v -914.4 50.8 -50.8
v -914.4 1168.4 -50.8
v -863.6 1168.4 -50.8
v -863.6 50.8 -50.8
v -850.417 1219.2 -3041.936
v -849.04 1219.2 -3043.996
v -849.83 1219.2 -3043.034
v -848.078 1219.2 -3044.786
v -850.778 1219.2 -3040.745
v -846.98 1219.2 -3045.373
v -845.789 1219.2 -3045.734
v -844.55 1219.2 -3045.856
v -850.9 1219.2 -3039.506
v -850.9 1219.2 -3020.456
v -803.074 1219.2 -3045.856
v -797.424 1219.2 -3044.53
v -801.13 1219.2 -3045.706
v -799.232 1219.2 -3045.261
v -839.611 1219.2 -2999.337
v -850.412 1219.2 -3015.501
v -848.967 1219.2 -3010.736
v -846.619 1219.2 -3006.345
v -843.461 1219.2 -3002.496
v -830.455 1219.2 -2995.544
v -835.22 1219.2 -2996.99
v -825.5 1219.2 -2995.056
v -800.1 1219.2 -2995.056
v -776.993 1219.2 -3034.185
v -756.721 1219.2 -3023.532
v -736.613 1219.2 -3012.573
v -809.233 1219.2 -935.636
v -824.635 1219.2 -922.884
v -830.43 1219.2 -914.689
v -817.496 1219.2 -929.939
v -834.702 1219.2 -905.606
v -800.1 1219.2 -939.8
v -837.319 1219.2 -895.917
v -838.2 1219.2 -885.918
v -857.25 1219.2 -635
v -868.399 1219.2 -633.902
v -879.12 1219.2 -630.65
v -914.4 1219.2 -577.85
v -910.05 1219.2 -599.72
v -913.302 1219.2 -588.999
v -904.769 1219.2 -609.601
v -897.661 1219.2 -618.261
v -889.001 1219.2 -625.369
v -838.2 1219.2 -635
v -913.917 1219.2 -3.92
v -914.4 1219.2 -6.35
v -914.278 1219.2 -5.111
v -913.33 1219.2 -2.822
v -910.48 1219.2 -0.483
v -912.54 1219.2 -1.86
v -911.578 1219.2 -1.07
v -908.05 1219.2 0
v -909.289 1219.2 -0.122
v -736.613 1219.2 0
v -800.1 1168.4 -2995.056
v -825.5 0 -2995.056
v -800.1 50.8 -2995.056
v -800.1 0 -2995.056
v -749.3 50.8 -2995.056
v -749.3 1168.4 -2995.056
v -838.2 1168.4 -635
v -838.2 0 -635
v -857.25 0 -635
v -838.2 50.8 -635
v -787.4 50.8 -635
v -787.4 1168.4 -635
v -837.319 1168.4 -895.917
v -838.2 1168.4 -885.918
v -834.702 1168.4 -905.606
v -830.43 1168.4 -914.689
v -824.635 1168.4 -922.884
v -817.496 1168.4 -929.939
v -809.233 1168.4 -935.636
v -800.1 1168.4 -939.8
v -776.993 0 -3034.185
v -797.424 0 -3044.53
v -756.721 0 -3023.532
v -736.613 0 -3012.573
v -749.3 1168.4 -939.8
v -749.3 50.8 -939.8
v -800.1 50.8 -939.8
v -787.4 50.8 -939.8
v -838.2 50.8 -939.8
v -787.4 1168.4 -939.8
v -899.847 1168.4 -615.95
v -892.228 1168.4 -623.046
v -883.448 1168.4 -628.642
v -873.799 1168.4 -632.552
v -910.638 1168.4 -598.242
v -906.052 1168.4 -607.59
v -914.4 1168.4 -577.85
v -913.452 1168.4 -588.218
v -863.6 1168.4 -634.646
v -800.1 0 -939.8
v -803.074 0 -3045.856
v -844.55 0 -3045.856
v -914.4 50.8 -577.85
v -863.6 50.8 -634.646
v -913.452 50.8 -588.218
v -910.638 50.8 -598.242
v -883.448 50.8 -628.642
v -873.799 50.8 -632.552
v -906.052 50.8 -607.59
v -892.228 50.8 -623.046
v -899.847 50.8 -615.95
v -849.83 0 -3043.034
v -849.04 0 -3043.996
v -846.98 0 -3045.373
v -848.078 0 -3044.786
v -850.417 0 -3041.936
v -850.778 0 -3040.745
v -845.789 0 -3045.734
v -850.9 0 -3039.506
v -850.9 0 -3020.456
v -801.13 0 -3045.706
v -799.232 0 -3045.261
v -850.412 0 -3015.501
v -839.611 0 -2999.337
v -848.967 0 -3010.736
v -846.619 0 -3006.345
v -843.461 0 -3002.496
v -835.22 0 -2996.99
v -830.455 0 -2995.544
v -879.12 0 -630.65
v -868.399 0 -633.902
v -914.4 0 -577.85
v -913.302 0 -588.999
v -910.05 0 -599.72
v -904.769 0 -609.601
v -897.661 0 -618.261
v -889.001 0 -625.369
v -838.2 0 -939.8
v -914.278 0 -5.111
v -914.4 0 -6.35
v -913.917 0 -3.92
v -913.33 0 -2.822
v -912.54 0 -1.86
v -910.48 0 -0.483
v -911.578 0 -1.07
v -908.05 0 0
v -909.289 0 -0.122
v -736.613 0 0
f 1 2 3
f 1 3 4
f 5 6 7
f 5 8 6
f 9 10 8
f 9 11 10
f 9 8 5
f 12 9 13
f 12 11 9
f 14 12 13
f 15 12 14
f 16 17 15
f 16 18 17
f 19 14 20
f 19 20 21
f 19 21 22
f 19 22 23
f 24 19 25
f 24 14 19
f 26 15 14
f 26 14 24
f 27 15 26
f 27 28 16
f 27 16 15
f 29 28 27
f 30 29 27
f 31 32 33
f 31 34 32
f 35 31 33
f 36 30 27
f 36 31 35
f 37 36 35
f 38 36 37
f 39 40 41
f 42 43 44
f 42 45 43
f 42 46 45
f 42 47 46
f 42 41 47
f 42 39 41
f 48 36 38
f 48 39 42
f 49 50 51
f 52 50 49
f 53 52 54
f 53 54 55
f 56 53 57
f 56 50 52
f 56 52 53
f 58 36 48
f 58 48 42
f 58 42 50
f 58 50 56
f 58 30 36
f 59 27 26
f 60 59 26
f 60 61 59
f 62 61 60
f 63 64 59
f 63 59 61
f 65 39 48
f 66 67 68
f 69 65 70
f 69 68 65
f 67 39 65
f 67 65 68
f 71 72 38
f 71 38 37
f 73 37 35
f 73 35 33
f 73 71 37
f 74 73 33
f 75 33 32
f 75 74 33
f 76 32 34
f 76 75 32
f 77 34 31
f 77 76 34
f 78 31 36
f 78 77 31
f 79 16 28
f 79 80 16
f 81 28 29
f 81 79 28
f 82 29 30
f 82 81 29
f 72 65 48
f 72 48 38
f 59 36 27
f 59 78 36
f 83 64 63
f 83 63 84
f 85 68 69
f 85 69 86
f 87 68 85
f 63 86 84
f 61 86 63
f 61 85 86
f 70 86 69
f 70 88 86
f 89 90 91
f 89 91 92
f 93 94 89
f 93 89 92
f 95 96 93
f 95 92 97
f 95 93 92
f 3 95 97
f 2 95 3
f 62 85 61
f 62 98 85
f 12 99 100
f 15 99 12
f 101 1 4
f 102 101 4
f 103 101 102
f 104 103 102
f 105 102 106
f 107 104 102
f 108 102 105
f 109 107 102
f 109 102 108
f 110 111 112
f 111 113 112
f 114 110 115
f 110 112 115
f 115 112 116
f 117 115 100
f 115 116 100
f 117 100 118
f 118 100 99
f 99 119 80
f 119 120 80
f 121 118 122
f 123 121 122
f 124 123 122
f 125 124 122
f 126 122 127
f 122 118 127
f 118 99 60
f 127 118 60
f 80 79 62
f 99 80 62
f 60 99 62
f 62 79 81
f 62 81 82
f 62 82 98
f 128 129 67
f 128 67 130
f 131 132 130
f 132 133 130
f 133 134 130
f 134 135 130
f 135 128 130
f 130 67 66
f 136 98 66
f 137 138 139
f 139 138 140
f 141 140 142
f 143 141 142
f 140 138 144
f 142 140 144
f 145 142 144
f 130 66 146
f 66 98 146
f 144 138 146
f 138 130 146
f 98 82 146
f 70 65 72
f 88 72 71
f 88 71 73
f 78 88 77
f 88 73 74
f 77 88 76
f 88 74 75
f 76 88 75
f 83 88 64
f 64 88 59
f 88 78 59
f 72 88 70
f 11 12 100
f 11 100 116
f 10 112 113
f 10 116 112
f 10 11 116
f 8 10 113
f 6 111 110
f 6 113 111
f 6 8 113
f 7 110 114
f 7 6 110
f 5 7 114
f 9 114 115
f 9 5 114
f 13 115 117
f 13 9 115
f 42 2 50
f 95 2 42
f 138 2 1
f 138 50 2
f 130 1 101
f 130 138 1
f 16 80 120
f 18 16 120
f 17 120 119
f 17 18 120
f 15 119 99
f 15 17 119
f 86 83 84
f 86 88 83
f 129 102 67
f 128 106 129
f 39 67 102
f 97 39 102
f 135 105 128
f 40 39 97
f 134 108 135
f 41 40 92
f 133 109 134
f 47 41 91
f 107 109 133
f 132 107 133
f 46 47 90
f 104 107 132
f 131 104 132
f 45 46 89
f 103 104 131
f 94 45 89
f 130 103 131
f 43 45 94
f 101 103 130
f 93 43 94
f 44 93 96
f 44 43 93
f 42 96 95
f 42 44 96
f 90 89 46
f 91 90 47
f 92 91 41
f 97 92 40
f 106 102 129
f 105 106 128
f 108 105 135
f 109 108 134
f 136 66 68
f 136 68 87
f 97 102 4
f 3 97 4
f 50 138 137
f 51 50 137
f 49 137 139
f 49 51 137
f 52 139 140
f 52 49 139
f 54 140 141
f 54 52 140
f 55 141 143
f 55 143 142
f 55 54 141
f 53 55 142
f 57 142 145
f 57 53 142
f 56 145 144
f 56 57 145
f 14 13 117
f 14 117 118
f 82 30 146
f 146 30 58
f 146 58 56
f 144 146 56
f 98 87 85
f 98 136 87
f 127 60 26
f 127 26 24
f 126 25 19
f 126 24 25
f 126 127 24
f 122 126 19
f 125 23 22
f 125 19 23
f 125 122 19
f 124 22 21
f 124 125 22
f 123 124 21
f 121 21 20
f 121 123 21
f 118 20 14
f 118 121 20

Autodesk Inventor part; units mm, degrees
ref_plane "YZ Plane" through (0, 0, 0) normal (1, 0, 0) x (0, 1, 0)
ref_plane "XZ Plane" through (0, 0, 0) normal (0, 1, 0) x (-1, 0, 0)
ref_plane "XY Plane" through (0, 0, 0) normal (0, 0, 1) x (1, 0, 0)
sketch "Sketch1" plane through (0, 0, 0) normal (0, 1, 0) x (-1, 0, 0)
  line L0 (0, 0) -> (914.4, 0)
  line L1 (914.4, 0) -> (914.4, -70.0282)
  line L2 (0, 0) -> (508, 0)
  line L3 (914.4, 0) -> (660.4, 0)
  line L4 (660.4, 0) -> (611.4196, -58.3726)
  arc A0 (611.4196, -58.3726) -> (0, -274.3016) centre (714.4556, -1323.7323) ccw
  arc A1 (0, -2040.0836) -> (800.1, -3045.8561) centre (1469.1296, -1692.5086) ccw
  arc A2 (0, -274.3016) -> (0, -2040.0836) centre (7568.6791, -1157.1926) ccw
  line L5 (914.4, 0) -> (660.4, 0)
  line L6 (914.4, 0) -> (914.4, -635)
  line L7 (914.4, -635) -> (838.2, -635)
  line L8 (838.2, -635) -> (838.2, -939.8)
  line L9 (838.2, -939.8) -> (800.1, -939.8)
  line L10 (800.1, -939.8) -> (800.1, -3045.8561)
  dimension "d1" = 3048
  dimension "d2" = 508
  dimension "d11" = 76.2
  dimension "d12" = 130
  dimension "d14" = 7620
  dimension "d15" = 635
  dimension "d16" = 76.2
  dimension "d17" = 304.8
  dimension "d18" = 38.1
extrude "Extrusion1" add sketch "Sketch1" along normal blind 1219.2
sketch "Sketch3" plane through (-914.4, 0, -635) normal (-1, 0, 0) x (0, 0, 1)
  line L0 (0, 0) -> (635, 0) projected
  line L1 (0, 0) -> (0, 1219.2) projected
  line L2 (635, 0) -> (0, 0)
  line L3 (0, 0) -> (0, 1219.2)
  line L4 (0, 1219.2) -> (635, 1219.2)
  line L5 (635, 1219.2) -> (635, 0)
  line L6 (584.2, 50.8) -> (50.8, 50.8)
  line L7 (50.8, 1168.4) -> (584.2, 1168.4)
  line L8 (584.2, 1168.4) -> (584.2, 50.8)
  line L9 (50.8, 50.8) -> (0, 50.8)
  line L10 (0, 0) -> (0, 1219.2) projected
  line L11 (0, 50.8) -> (0, 1168.4)
  line L12 (50.8, 1168.4) -> (0, 1168.4)
  point P0 (0, 1168.4)
  dimension "d24" = 50.8
extrude "Extrusion3" cut sketch "Sketch3" against normal blind 50.8 contours L1 L12 L7 L8 L6 L9
sketch "Sketch4" plane through (-838.2, 0, -939.8) normal (-1, 0, 0) x (0, 0, 1)
  line L0 (0, 1219.2) -> (304.8, 1219.2) projected
  line L1 (304.8, 0) -> (0, 0)
  line L2 (0, 0) -> (0, 1219.2)
  line L3 (0, 1219.2) -> (304.8, 1219.2)
  line L4 (304.8, 1219.2) -> (304.8, 0)
  line L5 (254, 50.8) -> (50.8, 50.8)
  line L6 (50.8, 1168.4) -> (254, 1168.4)
  line L7 (50.8, 1168.4) -> (0, 1168.4)
  line L8 (0, 0) -> (0, 1219.2) projected
  line L9 (50.8, 50.8) -> (0, 50.8)
  line L10 (0, 50.8) -> (0, 1168.4)
  line L11 (254, 50.8) -> (304.8, 50.8)
  line L12 (304.8, 50.8) -> (304.8, 1168.4)
  line L13 (304.8, 0) -> (304.8, 1219.2) projected
  line L14 (254, 1168.4) -> (304.8, 1168.4)
  point P0 (939.8, 0)
extrude "Extrusion4" cut sketch "Sketch4" against normal blind 50.8 contours L7 L6 L14 L4 L11 L5 L9 L2
sketch "Sketch5" plane through (-800.1, 0, -3045.8561) normal (-1, 0, 0) x (0, 0, 1)
  line L0 (0, 1219.2) -> (2106.0561, 1219.2) projected
  line L1 (2106.0561, 0) -> (0, 0)
  line L2 (0, 0) -> (0, 1219.2)
  line L3 (0, 1219.2) -> (2106.0561, 1219.2)
  line L4 (2106.0561, 1219.2) -> (2106.0561, 0)
  line L5 (2055.2561, 50.8) -> (50.8, 50.8)
  line L6 (50.8, 50.8) -> (50.8, 1168.4)
  line L7 (50.8, 1168.4) -> (2055.2561, 1168.4)
  line L8 (2055.2561, 50.8) -> (2106.0561, 50.8)
  line L9 (2106.0561, 0) -> (2106.0561, 1219.2) projected
  line L10 (2106.0561, 1168.4) -> (2106.0561, 1219.2) projected
  line L11 (2055.2561, 1168.4) -> (2106.0561, 1168.4)
  line L12 (2106.0561, 1168.4) -> (2106.0561, 50.8)
  point P0 (3045.8561, 0)
extrude "Extrusion5" cut sketch "Sketch5" against normal blind 50.8 contours L4 L8 L5 L6 L7 L11
sketch "Sketch6" plane through (-800.1, 0, -3045.8561) normal (-1, 0, 0) x (0, 0, 1)
  line L0 (0, 0) -> (0, 1219.2) projected
  line L1 (0, 0) -> (2106.0561, 0) projected
  line L2 (0, 1219.2) -> (50.8, 1219.2)
  line L3 (50.8, 1219.2) -> (50.8, 0)
  line L4 (50.8, 0) -> (0, 0)
  line L5 (0, 0) -> (0, 1219.2)
  point P0 (3045.8561, 0)
  dimension "d33" = 50.8
extrude "Extrusion6" add sketch "Sketch6" along normal blind 50.8
fillet "Fillet1" radius 25.4 1 edges at (-850.9, 609.6, -2995.0561)
fillet "Fillet2" radius 6.35 1 edges at (-850.9, 609.6, -3045.8561)
fillet "Fillet3" radius 12.7 1 edges at (-800.1, 609.6, -3045.8561)
fillet "Fillet4" radius 25.4 1 edges at (0, 609.6, -274.3016)
fillet "Fillet5" radius 57.15 1 edges at (-914.4, 1193.8, -635)
fillet "Fillet6" radius 57.15 1 edges at (-838.2, 1193.8, -939.8)
fillet "Fillet7" radius 6.35 1 edges at (-914.4, 609.6, 0)
ref_plane "Work Plane6" through (-736.6, 50.8, -50.8) normal (-1, 0, 0) x (0, 0, 1)
ref_plane "Work Plane7" through (128.5875, 50.8, -50.8) normal (-1, 0, 0) x (0, 0, 1)
sketch "Sketch9" plane through (128.5875, 50.8, -50.8) normal (-1, 0, 0) x (0, 0, 1)
  line L0 (204.9292, -115.2136) -> (-3165.499, -115.2136)
  line L1 (-3165.499, -115.2136) -> (-3165.499, 1233.5764)
  line L2 (-3165.499, 1233.5764) -> (204.9292, 1233.5764)
  line L3 (204.9292, 1233.5764) -> (204.9292, -115.2136)
  point P0 (50.8, -50.8)
extrude "Extrusion7" cut sketch "Sketch9" along normal blind 865.2002
properties part number "ShipDesign-ver3-1111-2021" material "Wood (Oak)"
